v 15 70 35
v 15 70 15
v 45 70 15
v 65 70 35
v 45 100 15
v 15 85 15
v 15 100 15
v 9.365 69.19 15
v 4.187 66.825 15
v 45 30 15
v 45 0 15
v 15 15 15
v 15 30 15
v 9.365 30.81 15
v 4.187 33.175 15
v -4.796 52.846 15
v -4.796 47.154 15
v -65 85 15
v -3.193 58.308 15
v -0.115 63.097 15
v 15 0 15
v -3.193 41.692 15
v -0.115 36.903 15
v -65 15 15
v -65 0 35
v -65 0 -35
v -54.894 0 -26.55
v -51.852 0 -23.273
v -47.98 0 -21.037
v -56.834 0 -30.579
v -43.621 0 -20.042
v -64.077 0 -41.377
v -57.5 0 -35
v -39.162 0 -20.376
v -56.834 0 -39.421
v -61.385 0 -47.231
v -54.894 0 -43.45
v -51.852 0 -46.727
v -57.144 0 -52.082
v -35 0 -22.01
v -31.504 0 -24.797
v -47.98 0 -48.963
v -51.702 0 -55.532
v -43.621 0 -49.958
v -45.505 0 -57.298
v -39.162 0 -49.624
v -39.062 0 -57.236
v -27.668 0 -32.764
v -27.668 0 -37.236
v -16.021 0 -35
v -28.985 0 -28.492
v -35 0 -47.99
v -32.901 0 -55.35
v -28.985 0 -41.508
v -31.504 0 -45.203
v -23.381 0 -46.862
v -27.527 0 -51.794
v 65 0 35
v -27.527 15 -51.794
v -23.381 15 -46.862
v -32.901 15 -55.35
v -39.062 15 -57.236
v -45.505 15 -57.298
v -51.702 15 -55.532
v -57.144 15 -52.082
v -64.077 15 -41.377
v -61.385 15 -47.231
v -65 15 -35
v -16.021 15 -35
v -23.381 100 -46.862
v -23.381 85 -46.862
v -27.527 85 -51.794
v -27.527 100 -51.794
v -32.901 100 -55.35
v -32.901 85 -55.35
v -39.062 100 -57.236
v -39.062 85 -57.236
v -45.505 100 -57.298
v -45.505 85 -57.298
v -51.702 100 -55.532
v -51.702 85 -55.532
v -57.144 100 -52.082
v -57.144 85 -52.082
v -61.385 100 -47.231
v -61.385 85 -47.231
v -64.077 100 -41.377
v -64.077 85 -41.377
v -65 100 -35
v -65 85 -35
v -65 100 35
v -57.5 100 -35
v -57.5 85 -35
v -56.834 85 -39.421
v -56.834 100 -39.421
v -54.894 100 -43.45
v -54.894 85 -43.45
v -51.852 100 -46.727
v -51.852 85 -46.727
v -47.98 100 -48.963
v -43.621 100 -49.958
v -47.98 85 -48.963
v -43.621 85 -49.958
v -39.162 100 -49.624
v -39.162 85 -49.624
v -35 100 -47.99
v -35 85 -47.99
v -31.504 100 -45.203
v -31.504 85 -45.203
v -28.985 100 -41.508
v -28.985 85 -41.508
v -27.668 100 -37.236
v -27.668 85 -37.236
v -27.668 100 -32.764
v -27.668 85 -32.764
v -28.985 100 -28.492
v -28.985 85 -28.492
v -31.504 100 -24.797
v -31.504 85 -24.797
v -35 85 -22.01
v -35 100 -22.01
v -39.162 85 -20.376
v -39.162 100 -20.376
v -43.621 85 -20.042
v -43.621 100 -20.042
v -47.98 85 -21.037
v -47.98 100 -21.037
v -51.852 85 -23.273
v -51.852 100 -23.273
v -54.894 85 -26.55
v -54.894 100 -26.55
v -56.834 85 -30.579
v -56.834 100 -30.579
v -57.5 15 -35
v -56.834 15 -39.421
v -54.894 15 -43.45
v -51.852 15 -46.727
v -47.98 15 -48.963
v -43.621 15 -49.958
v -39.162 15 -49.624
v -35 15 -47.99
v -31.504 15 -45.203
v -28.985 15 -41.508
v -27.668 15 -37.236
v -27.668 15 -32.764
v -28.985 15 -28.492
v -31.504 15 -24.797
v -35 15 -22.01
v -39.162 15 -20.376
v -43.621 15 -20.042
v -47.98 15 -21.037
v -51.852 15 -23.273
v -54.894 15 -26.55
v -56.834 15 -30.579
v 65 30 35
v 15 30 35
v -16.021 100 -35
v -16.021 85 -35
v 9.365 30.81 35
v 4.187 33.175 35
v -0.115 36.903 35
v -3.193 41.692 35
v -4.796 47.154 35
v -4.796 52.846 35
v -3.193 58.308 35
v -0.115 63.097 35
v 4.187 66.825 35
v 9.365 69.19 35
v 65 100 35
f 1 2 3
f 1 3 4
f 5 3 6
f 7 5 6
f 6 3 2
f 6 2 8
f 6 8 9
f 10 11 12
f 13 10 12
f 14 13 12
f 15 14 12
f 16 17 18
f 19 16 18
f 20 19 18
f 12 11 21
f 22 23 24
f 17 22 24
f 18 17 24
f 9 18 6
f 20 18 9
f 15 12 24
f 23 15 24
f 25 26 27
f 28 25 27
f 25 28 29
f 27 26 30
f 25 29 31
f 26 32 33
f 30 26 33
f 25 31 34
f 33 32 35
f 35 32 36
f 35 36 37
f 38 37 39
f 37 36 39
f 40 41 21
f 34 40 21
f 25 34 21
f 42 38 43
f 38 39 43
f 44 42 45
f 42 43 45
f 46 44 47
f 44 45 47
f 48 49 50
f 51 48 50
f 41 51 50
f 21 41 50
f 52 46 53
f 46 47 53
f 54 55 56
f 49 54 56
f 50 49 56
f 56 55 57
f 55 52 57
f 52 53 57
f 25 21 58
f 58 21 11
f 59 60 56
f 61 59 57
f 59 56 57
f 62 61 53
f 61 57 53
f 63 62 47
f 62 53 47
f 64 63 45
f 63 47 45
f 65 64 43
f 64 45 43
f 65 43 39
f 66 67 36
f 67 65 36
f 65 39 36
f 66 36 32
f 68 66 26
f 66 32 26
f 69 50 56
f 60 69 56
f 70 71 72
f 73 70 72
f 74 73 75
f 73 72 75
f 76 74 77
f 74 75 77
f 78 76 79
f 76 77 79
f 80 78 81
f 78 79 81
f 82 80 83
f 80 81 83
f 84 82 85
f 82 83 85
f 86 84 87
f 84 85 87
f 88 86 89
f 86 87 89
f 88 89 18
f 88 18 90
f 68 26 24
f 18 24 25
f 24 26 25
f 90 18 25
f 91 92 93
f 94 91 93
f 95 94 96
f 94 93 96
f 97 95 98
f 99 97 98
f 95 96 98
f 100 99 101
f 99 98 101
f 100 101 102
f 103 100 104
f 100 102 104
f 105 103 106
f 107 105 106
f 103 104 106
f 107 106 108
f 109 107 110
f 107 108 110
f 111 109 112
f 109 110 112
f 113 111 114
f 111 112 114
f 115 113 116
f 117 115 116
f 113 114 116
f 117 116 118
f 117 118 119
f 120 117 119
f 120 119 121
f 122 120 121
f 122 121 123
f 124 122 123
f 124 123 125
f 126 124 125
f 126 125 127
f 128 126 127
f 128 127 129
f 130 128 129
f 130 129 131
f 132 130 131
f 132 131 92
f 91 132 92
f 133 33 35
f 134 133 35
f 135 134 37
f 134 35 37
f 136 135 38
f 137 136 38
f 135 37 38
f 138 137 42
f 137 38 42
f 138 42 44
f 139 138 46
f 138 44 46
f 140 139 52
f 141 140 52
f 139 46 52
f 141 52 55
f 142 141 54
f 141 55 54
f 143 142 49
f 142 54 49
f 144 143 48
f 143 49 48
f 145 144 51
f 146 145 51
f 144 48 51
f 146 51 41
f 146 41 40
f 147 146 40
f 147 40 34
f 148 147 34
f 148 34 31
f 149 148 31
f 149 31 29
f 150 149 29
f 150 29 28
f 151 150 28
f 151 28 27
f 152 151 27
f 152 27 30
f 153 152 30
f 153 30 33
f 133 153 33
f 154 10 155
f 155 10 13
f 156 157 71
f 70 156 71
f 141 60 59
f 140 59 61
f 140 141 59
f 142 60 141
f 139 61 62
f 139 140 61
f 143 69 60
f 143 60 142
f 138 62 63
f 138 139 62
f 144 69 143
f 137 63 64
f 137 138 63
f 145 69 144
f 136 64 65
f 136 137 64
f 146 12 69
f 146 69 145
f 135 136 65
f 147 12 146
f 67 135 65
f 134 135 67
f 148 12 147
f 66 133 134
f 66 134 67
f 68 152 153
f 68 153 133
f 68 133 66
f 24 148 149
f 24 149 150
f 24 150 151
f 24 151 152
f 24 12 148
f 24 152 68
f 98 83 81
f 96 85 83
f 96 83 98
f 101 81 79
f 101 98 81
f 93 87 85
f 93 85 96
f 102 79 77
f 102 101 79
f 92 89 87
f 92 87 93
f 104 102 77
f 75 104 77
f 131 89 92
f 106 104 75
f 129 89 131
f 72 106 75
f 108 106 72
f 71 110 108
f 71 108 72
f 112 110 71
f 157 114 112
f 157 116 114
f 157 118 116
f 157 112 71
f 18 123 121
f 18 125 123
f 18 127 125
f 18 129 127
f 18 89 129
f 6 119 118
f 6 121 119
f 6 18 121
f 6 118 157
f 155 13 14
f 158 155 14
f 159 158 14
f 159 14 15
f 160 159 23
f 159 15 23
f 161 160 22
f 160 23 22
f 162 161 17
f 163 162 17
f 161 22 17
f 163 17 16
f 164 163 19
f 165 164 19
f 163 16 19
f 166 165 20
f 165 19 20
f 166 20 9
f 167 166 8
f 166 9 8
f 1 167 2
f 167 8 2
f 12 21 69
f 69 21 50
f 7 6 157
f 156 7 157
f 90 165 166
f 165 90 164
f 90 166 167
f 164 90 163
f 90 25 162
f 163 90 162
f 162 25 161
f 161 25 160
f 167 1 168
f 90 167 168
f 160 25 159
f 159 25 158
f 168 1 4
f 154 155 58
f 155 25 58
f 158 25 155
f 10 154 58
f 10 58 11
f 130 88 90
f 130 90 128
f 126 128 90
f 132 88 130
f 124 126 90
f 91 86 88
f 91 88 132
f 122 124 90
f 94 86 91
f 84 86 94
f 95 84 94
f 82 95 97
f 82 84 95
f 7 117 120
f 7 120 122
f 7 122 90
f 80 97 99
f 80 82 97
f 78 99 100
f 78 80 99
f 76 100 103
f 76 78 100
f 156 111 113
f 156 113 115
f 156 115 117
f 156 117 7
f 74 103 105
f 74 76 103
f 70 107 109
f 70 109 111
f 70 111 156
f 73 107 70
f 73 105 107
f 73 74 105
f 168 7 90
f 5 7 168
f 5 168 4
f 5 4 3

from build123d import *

# Parameters (mm, degrees)
BOSS_EXTRUDE1_DEPTH     = 100
SKETCH2_W               = 30
SKETCH2_H               = 15
CUT_EXTRUDE1_DEPTH      = 73.5
SKETCH2_3_W             = 30
SKETCH2_3_H             = 40
SKETCH2_3_W_2           = 61.993822349
CUT_EXTRUDE3_DEPTH      = 73.5
CUT_EXTRUDE3_DEPTH_BACK = 21


with BuildPart() as part:
    # Sketch1 → Boss-Extrude1 (new body)
    with BuildSketch(Plane(origin=(0, 0, 0), x_dir=(1, 0, 0), z_dir=(0, 1, 0))):
        with BuildLine():
            Line((15, -15), (-16.021323509, 35))
            Line((-16.021323509, 35), (-20, 35))
            ThreePointArc((-20, 35), (-42.5, 12.5), (-65, 35))
            Line((-65, 35), (-65, -35))
            Line((-65, -35), (65, -35))
            Line((65, -35), (45, -15))
            Line((45, -15), (15, -15))
        make_face()
        with BuildLine():
            ThreePointArc((-20, 35), (-20.861711534, 41.16720944), (-23.38084198, 46.862031723))
            ThreePointArc((-23.38084198, 46.862031723), (-48.66720944, 56.638288466), (-65, 35))
            Line((-65, 35), (-57.5, 35))
            ThreePointArc((-57.5, 35), (-42.5, 50), (-27.5, 35))
            Line((-27.5, 35), (-20, 35))
        make_face()
        with BuildLine():
            ThreePointArc((-65, 35), (-42.5, 12.5), (-20, 35))
            Line((-20, 35), (-27.5, 35))
            ThreePointArc((-27.5, 35), (-42.5, 20), (-57.5, 35))
            Line((-57.5, 35), (-65, 35))
        make_face()
        with BuildLine():
            Line((-16.021323509, 35), (-23.38084198, 46.862031723))
            ThreePointArc((-23.38084198, 46.862031723), (-20.861711534, 41.16720944), (-20, 35))
            Line((-20, 35), (-16.021323509, 35))
        make_face()
    extrude(amount=BOSS_EXTRUDE1_DEPTH)

    # Sketch2 → Cut-Extrude1 (cut, through all)
    with BuildSketch(Plane(origin=(0, 0, 15), x_dir=(-1, 0, 0), z_dir=(0, 0, -1))):
        with Locations((-30, 77.5)):
            Rectangle(SKETCH2_W, SKETCH2_H)
        with BuildLine():
            Line((-15, 85), (-15, 70))
            ThreePointArc((-15, 70), (5, 50), (-15, 30))
            Line((-15, 30), (-15, 15))
            Line((-15, 15), (76.993822349, 15))
            Line((76.993822349, 15), (76.993822349, 85))
            Line((76.993822349, 85), (-15, 85))
        make_face()
        with Locations((-30, 22.5)):
            Rectangle(SKETCH2_W, SKETCH2_H)
    extrude(amount=CUT_EXTRUDE1_DEPTH, mode=Mode.SUBTRACT)

    # Sketch2<3> → Cut-Extrude3 (cut, two sides)
    with BuildSketch(Plane(origin=(0, 0, 15), x_dir=(-1, 0, 0), z_dir=(0, 0, -1))) as cut_extrude3_sk:
        with Locations((-30, 50)):
            Rectangle(SKETCH2_3_W, SKETCH2_3_H)
        with Locations((-75.996911175, 50)):
            Rectangle(SKETCH2_3_W_2, SKETCH2_3_H)
        with BuildLine():
            ThreePointArc((-15, 30), (5, 50), (-15, 70))
            Line((-15, 70), (-15, 30))
        make_face()
    extrude(amount=CUT_EXTRUDE3_DEPTH, mode=Mode.SUBTRACT)
    extrude(cut_extrude3_sk.sketch, amount=-CUT_EXTRUDE3_DEPTH_BACK, mode=Mode.SUBTRACT)


solid = part.part
